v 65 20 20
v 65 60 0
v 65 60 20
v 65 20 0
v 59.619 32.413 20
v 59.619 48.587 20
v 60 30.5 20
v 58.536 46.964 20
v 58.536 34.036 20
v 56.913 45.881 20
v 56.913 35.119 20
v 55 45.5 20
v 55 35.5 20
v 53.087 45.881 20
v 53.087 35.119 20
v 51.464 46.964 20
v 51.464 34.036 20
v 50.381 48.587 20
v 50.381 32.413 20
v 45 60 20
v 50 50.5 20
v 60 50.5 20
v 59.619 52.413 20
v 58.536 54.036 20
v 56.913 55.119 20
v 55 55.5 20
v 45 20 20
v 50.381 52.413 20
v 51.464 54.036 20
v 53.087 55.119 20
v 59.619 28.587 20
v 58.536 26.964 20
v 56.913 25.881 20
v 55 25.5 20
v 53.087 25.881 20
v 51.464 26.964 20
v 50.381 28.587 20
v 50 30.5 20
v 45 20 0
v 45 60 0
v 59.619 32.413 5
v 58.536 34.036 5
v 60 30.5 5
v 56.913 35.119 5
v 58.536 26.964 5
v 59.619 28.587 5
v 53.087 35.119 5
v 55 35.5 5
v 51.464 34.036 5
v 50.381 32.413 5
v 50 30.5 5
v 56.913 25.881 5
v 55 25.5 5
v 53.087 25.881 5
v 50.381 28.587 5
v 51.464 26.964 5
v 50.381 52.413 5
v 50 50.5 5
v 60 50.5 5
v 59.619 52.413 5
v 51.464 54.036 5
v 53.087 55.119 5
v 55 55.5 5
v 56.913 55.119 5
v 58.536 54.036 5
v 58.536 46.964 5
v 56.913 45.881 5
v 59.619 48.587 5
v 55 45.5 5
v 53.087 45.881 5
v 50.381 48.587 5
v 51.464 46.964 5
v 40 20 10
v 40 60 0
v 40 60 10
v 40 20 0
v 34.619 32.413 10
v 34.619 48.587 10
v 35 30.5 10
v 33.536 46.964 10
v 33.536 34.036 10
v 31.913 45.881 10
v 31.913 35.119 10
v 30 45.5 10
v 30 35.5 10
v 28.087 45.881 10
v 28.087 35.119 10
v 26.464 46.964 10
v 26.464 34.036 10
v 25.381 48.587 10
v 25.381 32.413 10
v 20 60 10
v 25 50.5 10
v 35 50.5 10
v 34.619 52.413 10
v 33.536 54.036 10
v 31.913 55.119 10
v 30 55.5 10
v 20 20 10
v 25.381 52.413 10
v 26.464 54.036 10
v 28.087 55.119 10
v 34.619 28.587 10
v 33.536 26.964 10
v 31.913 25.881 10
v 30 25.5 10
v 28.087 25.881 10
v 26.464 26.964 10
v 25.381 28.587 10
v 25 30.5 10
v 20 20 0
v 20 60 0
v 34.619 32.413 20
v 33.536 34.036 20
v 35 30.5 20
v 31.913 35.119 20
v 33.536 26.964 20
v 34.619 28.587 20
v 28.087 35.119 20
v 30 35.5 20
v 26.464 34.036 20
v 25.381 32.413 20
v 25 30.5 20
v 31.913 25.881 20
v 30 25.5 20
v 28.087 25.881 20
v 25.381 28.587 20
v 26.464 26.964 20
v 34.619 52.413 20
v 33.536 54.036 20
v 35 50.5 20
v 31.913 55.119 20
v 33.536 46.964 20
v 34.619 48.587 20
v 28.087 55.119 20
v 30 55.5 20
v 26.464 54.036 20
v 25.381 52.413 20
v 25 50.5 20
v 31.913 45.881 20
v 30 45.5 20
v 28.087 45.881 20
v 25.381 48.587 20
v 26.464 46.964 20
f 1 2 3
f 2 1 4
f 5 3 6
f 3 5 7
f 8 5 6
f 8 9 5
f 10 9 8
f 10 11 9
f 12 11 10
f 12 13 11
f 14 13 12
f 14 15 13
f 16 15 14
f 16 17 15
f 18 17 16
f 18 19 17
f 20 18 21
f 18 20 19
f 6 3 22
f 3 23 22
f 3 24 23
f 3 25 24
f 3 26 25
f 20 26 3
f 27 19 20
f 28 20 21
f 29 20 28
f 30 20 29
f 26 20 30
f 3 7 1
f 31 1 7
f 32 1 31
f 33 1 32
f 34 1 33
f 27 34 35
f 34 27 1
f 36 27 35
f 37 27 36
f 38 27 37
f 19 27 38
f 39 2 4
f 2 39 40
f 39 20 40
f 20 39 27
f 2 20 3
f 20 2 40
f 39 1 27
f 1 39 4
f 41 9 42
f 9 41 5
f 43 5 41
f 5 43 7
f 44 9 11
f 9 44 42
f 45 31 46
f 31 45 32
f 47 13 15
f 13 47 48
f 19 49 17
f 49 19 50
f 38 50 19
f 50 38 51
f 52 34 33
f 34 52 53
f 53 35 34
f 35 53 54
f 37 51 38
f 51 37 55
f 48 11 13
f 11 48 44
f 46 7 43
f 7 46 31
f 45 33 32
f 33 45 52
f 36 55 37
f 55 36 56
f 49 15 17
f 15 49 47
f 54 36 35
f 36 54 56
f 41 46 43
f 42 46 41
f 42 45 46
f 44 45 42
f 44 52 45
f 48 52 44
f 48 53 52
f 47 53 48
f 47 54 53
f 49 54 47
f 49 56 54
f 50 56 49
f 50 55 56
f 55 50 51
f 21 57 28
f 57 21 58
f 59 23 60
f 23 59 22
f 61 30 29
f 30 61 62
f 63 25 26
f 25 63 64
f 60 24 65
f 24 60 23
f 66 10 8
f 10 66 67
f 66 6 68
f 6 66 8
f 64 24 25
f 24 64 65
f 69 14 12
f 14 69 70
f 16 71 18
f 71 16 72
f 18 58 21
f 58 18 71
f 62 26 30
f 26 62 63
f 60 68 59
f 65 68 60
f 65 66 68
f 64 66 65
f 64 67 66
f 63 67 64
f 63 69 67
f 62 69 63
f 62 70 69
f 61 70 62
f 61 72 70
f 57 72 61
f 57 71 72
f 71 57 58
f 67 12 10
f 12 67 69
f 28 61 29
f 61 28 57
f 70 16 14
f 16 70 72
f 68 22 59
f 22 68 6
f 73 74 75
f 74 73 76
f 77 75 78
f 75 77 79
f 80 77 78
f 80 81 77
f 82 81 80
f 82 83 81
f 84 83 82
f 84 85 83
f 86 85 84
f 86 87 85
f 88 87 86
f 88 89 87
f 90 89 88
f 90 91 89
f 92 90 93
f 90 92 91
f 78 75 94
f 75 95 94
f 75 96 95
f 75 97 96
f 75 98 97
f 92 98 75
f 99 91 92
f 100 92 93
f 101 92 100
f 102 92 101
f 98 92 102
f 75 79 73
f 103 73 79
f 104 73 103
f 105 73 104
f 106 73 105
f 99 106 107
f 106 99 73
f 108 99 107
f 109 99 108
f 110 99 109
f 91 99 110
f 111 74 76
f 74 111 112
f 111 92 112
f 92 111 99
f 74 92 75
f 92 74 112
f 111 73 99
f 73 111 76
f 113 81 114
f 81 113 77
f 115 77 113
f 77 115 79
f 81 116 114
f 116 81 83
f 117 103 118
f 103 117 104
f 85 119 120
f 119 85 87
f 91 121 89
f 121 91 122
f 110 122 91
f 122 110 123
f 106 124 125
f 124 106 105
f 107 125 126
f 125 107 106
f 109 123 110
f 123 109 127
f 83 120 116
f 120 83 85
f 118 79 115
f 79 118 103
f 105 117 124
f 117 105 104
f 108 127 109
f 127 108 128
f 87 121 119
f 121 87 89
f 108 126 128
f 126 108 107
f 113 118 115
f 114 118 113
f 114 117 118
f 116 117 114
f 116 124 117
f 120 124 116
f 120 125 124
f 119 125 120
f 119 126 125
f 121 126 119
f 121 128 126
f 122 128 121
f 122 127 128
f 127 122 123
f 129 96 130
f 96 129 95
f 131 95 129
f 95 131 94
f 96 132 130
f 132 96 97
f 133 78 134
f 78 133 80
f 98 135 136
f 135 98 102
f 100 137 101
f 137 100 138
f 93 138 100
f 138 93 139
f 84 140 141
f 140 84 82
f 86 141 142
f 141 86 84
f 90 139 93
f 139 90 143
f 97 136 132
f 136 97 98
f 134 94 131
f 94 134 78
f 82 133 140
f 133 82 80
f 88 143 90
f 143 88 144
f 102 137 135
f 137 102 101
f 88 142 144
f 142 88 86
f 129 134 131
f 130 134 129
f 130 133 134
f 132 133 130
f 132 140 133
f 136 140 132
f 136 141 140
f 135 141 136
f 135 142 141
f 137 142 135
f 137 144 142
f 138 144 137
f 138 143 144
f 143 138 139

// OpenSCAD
/*difference() {
    cube([75.5+31, 51.5 + 31,3]);
    translate([15.5, 15.5, -2]) {
    cube([75.5, 51.5,6]);
    }
}*/
translate([20, 20, 0]) {
cube([20, 40, 10]);
}
translate([30, 30.5, 0]) {
    cylinder(20, 5, 5);
}
translate([30, 50.5, 0]) {
    cylinder(20, 5, 5);
}
translate([25, 0, 0]) {
difference() {
    translate([20, 20, 0]) {
cube([20, 40, 20]);
}
translate([30, 30.5, 5]) {
    cylinder(20, 5, 5);
}
translate([30, 50.5, 5]) {
    cylinder(20, 5, 5);
}
}
}
